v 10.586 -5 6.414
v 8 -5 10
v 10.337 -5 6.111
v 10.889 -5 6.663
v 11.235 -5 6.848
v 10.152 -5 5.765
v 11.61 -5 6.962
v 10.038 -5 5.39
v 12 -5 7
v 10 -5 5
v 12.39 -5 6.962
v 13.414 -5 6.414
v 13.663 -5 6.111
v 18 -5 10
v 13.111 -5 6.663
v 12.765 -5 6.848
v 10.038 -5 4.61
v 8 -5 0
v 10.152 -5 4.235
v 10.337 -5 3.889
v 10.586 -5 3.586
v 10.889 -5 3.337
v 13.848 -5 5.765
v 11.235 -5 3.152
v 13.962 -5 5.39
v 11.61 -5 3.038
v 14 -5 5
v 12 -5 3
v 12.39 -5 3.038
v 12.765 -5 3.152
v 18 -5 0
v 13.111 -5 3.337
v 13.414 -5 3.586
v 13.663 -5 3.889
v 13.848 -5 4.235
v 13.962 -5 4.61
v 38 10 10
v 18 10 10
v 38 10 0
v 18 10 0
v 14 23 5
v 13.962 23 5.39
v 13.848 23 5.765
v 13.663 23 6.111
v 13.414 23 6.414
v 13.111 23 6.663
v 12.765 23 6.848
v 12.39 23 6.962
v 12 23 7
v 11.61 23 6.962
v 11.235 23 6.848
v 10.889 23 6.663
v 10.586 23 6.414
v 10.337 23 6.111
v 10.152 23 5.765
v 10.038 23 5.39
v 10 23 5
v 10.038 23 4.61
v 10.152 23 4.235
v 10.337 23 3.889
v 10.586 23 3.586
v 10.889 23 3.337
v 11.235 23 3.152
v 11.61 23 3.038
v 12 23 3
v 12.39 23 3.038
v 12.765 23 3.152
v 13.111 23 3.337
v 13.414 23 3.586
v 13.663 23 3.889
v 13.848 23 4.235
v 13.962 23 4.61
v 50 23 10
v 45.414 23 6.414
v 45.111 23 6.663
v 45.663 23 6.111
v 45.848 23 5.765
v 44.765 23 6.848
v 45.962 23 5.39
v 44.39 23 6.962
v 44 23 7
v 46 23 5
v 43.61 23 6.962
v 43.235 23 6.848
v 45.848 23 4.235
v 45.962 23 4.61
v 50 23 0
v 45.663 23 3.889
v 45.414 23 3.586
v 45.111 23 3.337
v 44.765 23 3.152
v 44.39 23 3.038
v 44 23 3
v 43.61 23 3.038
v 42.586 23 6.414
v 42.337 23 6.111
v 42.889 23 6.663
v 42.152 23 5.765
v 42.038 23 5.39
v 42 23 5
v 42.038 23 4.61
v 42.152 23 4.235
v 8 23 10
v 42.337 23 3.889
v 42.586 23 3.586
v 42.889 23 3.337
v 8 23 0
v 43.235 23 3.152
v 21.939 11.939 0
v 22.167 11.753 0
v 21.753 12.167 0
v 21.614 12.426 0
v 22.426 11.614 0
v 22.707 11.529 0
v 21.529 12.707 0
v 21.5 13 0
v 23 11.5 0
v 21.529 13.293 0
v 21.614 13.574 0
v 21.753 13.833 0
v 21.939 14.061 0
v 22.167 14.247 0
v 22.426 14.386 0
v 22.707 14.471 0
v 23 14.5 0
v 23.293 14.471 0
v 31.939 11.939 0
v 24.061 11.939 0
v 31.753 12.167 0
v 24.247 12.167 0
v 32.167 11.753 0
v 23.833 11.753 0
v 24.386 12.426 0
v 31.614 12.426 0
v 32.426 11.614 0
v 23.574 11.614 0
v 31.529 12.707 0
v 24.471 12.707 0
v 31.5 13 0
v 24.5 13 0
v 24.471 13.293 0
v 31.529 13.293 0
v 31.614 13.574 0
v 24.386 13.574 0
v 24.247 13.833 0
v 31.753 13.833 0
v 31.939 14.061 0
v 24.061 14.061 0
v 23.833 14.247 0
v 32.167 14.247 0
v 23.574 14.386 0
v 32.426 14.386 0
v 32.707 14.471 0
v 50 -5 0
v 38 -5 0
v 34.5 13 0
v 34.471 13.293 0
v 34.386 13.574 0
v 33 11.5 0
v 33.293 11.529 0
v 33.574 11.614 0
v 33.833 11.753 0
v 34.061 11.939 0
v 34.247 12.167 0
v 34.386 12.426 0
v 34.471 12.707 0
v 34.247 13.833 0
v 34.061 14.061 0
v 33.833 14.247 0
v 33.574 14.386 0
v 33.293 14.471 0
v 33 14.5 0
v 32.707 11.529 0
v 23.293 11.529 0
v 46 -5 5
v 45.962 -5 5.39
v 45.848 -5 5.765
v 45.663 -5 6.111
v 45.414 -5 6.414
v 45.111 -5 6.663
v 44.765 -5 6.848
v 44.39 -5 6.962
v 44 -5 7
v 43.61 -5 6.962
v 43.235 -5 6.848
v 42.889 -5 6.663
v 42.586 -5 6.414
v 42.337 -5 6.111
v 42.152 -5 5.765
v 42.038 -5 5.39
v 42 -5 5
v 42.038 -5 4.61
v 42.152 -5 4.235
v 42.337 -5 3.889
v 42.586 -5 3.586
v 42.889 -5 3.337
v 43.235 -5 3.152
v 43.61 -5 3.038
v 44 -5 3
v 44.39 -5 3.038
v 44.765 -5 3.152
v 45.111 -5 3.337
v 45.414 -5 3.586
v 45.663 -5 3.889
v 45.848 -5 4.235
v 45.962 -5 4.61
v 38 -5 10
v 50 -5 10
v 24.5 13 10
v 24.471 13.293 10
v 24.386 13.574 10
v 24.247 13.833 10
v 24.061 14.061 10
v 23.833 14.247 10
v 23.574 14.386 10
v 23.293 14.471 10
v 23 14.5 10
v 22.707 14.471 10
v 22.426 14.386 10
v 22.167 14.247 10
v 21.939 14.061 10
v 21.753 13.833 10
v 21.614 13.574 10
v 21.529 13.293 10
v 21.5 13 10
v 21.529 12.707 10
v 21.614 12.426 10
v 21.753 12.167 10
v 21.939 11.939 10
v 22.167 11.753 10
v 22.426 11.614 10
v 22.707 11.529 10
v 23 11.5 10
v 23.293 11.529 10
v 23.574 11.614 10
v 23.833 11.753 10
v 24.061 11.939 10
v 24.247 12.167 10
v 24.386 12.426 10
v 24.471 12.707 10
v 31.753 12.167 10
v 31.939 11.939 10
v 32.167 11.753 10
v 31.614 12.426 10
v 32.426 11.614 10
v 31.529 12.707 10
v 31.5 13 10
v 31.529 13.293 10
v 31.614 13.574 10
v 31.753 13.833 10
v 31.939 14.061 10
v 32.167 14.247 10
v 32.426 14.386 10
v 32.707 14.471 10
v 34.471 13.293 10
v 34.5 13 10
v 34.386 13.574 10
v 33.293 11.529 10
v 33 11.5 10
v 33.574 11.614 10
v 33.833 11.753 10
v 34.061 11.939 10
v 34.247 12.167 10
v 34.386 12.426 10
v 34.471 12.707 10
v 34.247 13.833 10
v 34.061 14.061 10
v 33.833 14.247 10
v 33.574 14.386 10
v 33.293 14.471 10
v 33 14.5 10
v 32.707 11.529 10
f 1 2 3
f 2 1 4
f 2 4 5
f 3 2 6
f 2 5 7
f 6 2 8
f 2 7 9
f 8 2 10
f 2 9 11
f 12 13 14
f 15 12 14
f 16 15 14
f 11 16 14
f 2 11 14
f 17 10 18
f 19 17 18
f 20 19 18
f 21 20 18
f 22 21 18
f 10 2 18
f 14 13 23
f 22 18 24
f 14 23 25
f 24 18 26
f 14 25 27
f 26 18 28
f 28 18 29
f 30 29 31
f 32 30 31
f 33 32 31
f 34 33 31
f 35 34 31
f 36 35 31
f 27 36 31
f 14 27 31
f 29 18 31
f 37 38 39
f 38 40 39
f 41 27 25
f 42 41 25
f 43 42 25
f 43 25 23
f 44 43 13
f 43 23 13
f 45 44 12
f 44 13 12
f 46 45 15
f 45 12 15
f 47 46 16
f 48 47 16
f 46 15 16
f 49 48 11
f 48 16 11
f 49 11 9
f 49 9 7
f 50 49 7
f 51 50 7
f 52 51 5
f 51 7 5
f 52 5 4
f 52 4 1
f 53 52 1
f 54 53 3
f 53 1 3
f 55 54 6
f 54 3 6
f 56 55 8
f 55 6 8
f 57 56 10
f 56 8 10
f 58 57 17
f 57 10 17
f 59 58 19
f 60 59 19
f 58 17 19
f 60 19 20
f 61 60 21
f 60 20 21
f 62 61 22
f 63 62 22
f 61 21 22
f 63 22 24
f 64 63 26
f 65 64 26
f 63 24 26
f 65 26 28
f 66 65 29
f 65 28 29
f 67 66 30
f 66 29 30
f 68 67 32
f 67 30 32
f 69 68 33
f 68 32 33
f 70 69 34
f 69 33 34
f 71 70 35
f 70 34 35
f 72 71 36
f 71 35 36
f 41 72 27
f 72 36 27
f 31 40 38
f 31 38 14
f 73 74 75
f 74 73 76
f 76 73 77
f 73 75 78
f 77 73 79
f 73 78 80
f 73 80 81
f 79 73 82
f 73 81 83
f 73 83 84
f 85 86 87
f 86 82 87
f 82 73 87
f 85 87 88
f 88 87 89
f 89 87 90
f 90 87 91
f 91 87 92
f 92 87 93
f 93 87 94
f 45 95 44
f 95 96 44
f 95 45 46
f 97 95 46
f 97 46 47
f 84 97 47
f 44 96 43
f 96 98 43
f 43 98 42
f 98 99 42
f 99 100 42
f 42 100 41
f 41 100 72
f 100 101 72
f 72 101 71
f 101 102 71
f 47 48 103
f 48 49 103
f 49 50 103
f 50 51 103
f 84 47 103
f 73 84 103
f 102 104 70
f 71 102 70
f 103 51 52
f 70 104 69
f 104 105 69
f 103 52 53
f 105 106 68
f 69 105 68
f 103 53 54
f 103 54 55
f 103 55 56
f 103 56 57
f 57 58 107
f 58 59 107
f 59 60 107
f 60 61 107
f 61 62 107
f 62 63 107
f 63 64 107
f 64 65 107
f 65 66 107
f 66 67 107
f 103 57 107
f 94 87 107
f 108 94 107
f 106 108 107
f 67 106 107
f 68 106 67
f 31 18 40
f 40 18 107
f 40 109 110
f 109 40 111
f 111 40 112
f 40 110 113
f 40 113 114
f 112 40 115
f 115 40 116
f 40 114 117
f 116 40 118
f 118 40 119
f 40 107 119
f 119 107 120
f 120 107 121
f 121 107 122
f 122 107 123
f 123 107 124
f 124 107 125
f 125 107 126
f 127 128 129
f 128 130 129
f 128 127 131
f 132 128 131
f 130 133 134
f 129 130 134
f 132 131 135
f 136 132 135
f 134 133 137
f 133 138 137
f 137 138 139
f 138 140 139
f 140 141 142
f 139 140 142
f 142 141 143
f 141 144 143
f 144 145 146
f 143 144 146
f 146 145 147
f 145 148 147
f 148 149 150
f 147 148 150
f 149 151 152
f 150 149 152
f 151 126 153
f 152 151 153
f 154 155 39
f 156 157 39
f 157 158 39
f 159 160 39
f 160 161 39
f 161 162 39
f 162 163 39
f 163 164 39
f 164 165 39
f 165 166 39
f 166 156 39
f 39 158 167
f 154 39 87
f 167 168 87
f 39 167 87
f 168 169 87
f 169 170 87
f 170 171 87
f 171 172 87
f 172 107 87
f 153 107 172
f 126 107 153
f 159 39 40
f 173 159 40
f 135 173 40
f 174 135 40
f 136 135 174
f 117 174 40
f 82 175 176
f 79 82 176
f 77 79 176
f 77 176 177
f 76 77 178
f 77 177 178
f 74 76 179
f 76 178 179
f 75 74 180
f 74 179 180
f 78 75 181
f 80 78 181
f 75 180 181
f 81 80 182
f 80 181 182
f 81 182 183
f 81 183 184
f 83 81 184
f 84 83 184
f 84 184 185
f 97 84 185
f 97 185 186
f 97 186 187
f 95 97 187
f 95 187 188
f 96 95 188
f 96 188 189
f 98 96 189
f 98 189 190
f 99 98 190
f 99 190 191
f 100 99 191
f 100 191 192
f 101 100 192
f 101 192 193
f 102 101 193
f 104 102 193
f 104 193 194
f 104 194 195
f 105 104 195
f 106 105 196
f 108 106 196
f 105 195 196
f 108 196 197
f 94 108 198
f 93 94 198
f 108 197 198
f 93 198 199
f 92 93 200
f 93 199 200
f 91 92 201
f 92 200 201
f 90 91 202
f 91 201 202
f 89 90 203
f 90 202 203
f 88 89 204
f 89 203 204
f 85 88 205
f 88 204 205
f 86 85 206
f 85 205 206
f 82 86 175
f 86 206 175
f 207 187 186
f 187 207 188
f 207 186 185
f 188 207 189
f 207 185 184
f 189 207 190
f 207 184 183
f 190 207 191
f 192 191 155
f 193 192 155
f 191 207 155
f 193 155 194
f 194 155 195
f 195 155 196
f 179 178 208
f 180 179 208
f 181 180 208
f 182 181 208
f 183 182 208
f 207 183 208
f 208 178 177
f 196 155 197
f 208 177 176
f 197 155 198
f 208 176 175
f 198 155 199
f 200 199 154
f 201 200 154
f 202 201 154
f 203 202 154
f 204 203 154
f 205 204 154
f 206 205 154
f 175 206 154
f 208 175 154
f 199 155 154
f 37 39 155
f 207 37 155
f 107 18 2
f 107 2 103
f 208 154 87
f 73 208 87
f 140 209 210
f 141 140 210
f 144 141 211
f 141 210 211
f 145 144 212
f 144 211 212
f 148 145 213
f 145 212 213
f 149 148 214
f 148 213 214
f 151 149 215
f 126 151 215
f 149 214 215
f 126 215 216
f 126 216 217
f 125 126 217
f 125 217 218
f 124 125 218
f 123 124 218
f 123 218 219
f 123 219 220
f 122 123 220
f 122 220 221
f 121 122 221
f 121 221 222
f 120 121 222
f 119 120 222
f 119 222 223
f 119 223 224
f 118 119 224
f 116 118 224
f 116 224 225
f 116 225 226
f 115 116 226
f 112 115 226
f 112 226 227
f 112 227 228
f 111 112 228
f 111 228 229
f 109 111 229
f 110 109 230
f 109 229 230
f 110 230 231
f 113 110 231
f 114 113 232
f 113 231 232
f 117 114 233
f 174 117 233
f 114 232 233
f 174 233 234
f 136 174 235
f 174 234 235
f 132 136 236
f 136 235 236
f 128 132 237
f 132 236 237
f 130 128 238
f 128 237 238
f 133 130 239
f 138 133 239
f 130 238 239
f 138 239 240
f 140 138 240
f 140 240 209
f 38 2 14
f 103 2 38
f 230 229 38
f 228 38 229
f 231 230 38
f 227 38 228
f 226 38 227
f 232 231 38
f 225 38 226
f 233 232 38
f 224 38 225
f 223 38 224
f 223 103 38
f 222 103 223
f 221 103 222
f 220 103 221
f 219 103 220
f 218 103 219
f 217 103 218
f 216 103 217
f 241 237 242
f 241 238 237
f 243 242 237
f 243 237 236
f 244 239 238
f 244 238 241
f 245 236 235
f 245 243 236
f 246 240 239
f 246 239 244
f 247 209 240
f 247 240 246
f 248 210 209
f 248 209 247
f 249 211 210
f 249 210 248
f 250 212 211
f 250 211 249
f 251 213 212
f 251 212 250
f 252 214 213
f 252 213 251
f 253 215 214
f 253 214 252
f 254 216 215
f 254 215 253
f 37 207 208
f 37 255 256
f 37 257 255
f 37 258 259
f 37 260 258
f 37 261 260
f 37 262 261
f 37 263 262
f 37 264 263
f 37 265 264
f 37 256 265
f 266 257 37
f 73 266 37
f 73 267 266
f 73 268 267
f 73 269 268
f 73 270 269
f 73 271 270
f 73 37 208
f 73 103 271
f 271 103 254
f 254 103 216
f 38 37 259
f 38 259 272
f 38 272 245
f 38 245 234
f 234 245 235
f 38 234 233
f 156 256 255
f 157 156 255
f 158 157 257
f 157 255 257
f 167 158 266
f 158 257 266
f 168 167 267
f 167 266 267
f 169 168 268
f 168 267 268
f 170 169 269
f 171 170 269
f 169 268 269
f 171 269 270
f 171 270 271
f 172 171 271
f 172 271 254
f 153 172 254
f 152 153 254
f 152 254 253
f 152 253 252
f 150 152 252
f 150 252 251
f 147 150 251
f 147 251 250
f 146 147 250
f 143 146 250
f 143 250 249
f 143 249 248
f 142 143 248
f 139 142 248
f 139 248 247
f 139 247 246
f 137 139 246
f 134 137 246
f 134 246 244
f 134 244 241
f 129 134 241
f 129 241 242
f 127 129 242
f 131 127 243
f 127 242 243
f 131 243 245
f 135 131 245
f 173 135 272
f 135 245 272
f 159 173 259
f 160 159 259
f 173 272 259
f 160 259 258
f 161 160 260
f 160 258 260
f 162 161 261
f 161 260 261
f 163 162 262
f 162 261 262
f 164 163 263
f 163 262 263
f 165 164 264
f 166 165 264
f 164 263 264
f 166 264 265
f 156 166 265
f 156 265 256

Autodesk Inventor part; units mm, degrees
ref_plane "YZ Plane" through (0, 0, 0) normal (1, 0, 0) x (0, 1, 0)
ref_plane "XZ Plane" through (0, 0, 0) normal (0, 1, 0) x (-1, 0, 0)
ref_plane "XY Plane" through (0, 0, 0) normal (0, 0, 1) x (1, 0, 0)
sketch "Sketch1" plane through (0, 0, 0) normal (0, 0, 1) x (1, 0, 0)
  line L0 (50, -5) -> (50, 23)
  line L1 (50, 23) -> (8, 23)
  line L2 (18, 10) -> (38, 10)
  line L3 (18, 10) -> (18, -5)
  line L4 (38, 10) -> (38, -5)
  line L5 (8, -5) -> (8, 23)
  line L6 (8, -5) -> (18, -5)
  line L7 (38, -5) -> (50, -5)
  dimension "d1" = 28
  dimension "d4" = 15
  dimension "d14" = 20
  dimension "d16" = 12
  dimension "d37" = 42
  dimension "d46" = 28
extrude "Extrusion3" add sketch "Sketch1" along normal blind 10
sketch "Sketch5" plane through (8, -5, 0) normal (0, -1, 0) x (1, 0, 0)
  circle A0 centre (4, 5) radius 2
  line L0 (10, 0) -> (10, 10) projected
  line L1 (0, 0) -> (10, 0) projected
  circle A1 centre (36, 5) radius 2
  line L2 (30, 0) -> (30, 10) projected
  line L3 (30, 0) -> (42, 0) projected
  dimension "d38" = 4
  dimension "d39" = 6
  dimension "d40" = 5
  dimension "d41" = 4
  dimension "d42" = 6
  dimension "d43" = 5
extrude "Extrusion6" cut sketch "Sketch5" against normal blind 100
sketch "Boceto6" plane through (0, 0, 10) normal (0, 0, 1) x (1, 0, 0)
  line L0 (50, 23) -> (8, 23) projected
  circle A0 centre (23, 13) radius 1.5
  circle A1 centre (33, 13) radius 1.5
  line L1 (50, -5) -> (50, 23) projected
  line L2 (38, 10) -> (38, -5) projected
  point P0 (0, 0)
  dimension "d50" = 3
  dimension "d51" = 3
  dimension "d52" = 10
  dimension "d53" = 10
  dimension "d62" = 5
extrude "Extrusión7" cut sketch "Boceto6" against normal blind 10
thread "Rosca1" size "M3x0.5" class "6H" standard "ANSI Metric M Profile" length 12
thread "Rosca2" size "M3x0.5" class "6H" standard "ANSI Metric M Profile" length 12
properties part number "Espaciador Izquierdo" material "Aluminum 6061"
